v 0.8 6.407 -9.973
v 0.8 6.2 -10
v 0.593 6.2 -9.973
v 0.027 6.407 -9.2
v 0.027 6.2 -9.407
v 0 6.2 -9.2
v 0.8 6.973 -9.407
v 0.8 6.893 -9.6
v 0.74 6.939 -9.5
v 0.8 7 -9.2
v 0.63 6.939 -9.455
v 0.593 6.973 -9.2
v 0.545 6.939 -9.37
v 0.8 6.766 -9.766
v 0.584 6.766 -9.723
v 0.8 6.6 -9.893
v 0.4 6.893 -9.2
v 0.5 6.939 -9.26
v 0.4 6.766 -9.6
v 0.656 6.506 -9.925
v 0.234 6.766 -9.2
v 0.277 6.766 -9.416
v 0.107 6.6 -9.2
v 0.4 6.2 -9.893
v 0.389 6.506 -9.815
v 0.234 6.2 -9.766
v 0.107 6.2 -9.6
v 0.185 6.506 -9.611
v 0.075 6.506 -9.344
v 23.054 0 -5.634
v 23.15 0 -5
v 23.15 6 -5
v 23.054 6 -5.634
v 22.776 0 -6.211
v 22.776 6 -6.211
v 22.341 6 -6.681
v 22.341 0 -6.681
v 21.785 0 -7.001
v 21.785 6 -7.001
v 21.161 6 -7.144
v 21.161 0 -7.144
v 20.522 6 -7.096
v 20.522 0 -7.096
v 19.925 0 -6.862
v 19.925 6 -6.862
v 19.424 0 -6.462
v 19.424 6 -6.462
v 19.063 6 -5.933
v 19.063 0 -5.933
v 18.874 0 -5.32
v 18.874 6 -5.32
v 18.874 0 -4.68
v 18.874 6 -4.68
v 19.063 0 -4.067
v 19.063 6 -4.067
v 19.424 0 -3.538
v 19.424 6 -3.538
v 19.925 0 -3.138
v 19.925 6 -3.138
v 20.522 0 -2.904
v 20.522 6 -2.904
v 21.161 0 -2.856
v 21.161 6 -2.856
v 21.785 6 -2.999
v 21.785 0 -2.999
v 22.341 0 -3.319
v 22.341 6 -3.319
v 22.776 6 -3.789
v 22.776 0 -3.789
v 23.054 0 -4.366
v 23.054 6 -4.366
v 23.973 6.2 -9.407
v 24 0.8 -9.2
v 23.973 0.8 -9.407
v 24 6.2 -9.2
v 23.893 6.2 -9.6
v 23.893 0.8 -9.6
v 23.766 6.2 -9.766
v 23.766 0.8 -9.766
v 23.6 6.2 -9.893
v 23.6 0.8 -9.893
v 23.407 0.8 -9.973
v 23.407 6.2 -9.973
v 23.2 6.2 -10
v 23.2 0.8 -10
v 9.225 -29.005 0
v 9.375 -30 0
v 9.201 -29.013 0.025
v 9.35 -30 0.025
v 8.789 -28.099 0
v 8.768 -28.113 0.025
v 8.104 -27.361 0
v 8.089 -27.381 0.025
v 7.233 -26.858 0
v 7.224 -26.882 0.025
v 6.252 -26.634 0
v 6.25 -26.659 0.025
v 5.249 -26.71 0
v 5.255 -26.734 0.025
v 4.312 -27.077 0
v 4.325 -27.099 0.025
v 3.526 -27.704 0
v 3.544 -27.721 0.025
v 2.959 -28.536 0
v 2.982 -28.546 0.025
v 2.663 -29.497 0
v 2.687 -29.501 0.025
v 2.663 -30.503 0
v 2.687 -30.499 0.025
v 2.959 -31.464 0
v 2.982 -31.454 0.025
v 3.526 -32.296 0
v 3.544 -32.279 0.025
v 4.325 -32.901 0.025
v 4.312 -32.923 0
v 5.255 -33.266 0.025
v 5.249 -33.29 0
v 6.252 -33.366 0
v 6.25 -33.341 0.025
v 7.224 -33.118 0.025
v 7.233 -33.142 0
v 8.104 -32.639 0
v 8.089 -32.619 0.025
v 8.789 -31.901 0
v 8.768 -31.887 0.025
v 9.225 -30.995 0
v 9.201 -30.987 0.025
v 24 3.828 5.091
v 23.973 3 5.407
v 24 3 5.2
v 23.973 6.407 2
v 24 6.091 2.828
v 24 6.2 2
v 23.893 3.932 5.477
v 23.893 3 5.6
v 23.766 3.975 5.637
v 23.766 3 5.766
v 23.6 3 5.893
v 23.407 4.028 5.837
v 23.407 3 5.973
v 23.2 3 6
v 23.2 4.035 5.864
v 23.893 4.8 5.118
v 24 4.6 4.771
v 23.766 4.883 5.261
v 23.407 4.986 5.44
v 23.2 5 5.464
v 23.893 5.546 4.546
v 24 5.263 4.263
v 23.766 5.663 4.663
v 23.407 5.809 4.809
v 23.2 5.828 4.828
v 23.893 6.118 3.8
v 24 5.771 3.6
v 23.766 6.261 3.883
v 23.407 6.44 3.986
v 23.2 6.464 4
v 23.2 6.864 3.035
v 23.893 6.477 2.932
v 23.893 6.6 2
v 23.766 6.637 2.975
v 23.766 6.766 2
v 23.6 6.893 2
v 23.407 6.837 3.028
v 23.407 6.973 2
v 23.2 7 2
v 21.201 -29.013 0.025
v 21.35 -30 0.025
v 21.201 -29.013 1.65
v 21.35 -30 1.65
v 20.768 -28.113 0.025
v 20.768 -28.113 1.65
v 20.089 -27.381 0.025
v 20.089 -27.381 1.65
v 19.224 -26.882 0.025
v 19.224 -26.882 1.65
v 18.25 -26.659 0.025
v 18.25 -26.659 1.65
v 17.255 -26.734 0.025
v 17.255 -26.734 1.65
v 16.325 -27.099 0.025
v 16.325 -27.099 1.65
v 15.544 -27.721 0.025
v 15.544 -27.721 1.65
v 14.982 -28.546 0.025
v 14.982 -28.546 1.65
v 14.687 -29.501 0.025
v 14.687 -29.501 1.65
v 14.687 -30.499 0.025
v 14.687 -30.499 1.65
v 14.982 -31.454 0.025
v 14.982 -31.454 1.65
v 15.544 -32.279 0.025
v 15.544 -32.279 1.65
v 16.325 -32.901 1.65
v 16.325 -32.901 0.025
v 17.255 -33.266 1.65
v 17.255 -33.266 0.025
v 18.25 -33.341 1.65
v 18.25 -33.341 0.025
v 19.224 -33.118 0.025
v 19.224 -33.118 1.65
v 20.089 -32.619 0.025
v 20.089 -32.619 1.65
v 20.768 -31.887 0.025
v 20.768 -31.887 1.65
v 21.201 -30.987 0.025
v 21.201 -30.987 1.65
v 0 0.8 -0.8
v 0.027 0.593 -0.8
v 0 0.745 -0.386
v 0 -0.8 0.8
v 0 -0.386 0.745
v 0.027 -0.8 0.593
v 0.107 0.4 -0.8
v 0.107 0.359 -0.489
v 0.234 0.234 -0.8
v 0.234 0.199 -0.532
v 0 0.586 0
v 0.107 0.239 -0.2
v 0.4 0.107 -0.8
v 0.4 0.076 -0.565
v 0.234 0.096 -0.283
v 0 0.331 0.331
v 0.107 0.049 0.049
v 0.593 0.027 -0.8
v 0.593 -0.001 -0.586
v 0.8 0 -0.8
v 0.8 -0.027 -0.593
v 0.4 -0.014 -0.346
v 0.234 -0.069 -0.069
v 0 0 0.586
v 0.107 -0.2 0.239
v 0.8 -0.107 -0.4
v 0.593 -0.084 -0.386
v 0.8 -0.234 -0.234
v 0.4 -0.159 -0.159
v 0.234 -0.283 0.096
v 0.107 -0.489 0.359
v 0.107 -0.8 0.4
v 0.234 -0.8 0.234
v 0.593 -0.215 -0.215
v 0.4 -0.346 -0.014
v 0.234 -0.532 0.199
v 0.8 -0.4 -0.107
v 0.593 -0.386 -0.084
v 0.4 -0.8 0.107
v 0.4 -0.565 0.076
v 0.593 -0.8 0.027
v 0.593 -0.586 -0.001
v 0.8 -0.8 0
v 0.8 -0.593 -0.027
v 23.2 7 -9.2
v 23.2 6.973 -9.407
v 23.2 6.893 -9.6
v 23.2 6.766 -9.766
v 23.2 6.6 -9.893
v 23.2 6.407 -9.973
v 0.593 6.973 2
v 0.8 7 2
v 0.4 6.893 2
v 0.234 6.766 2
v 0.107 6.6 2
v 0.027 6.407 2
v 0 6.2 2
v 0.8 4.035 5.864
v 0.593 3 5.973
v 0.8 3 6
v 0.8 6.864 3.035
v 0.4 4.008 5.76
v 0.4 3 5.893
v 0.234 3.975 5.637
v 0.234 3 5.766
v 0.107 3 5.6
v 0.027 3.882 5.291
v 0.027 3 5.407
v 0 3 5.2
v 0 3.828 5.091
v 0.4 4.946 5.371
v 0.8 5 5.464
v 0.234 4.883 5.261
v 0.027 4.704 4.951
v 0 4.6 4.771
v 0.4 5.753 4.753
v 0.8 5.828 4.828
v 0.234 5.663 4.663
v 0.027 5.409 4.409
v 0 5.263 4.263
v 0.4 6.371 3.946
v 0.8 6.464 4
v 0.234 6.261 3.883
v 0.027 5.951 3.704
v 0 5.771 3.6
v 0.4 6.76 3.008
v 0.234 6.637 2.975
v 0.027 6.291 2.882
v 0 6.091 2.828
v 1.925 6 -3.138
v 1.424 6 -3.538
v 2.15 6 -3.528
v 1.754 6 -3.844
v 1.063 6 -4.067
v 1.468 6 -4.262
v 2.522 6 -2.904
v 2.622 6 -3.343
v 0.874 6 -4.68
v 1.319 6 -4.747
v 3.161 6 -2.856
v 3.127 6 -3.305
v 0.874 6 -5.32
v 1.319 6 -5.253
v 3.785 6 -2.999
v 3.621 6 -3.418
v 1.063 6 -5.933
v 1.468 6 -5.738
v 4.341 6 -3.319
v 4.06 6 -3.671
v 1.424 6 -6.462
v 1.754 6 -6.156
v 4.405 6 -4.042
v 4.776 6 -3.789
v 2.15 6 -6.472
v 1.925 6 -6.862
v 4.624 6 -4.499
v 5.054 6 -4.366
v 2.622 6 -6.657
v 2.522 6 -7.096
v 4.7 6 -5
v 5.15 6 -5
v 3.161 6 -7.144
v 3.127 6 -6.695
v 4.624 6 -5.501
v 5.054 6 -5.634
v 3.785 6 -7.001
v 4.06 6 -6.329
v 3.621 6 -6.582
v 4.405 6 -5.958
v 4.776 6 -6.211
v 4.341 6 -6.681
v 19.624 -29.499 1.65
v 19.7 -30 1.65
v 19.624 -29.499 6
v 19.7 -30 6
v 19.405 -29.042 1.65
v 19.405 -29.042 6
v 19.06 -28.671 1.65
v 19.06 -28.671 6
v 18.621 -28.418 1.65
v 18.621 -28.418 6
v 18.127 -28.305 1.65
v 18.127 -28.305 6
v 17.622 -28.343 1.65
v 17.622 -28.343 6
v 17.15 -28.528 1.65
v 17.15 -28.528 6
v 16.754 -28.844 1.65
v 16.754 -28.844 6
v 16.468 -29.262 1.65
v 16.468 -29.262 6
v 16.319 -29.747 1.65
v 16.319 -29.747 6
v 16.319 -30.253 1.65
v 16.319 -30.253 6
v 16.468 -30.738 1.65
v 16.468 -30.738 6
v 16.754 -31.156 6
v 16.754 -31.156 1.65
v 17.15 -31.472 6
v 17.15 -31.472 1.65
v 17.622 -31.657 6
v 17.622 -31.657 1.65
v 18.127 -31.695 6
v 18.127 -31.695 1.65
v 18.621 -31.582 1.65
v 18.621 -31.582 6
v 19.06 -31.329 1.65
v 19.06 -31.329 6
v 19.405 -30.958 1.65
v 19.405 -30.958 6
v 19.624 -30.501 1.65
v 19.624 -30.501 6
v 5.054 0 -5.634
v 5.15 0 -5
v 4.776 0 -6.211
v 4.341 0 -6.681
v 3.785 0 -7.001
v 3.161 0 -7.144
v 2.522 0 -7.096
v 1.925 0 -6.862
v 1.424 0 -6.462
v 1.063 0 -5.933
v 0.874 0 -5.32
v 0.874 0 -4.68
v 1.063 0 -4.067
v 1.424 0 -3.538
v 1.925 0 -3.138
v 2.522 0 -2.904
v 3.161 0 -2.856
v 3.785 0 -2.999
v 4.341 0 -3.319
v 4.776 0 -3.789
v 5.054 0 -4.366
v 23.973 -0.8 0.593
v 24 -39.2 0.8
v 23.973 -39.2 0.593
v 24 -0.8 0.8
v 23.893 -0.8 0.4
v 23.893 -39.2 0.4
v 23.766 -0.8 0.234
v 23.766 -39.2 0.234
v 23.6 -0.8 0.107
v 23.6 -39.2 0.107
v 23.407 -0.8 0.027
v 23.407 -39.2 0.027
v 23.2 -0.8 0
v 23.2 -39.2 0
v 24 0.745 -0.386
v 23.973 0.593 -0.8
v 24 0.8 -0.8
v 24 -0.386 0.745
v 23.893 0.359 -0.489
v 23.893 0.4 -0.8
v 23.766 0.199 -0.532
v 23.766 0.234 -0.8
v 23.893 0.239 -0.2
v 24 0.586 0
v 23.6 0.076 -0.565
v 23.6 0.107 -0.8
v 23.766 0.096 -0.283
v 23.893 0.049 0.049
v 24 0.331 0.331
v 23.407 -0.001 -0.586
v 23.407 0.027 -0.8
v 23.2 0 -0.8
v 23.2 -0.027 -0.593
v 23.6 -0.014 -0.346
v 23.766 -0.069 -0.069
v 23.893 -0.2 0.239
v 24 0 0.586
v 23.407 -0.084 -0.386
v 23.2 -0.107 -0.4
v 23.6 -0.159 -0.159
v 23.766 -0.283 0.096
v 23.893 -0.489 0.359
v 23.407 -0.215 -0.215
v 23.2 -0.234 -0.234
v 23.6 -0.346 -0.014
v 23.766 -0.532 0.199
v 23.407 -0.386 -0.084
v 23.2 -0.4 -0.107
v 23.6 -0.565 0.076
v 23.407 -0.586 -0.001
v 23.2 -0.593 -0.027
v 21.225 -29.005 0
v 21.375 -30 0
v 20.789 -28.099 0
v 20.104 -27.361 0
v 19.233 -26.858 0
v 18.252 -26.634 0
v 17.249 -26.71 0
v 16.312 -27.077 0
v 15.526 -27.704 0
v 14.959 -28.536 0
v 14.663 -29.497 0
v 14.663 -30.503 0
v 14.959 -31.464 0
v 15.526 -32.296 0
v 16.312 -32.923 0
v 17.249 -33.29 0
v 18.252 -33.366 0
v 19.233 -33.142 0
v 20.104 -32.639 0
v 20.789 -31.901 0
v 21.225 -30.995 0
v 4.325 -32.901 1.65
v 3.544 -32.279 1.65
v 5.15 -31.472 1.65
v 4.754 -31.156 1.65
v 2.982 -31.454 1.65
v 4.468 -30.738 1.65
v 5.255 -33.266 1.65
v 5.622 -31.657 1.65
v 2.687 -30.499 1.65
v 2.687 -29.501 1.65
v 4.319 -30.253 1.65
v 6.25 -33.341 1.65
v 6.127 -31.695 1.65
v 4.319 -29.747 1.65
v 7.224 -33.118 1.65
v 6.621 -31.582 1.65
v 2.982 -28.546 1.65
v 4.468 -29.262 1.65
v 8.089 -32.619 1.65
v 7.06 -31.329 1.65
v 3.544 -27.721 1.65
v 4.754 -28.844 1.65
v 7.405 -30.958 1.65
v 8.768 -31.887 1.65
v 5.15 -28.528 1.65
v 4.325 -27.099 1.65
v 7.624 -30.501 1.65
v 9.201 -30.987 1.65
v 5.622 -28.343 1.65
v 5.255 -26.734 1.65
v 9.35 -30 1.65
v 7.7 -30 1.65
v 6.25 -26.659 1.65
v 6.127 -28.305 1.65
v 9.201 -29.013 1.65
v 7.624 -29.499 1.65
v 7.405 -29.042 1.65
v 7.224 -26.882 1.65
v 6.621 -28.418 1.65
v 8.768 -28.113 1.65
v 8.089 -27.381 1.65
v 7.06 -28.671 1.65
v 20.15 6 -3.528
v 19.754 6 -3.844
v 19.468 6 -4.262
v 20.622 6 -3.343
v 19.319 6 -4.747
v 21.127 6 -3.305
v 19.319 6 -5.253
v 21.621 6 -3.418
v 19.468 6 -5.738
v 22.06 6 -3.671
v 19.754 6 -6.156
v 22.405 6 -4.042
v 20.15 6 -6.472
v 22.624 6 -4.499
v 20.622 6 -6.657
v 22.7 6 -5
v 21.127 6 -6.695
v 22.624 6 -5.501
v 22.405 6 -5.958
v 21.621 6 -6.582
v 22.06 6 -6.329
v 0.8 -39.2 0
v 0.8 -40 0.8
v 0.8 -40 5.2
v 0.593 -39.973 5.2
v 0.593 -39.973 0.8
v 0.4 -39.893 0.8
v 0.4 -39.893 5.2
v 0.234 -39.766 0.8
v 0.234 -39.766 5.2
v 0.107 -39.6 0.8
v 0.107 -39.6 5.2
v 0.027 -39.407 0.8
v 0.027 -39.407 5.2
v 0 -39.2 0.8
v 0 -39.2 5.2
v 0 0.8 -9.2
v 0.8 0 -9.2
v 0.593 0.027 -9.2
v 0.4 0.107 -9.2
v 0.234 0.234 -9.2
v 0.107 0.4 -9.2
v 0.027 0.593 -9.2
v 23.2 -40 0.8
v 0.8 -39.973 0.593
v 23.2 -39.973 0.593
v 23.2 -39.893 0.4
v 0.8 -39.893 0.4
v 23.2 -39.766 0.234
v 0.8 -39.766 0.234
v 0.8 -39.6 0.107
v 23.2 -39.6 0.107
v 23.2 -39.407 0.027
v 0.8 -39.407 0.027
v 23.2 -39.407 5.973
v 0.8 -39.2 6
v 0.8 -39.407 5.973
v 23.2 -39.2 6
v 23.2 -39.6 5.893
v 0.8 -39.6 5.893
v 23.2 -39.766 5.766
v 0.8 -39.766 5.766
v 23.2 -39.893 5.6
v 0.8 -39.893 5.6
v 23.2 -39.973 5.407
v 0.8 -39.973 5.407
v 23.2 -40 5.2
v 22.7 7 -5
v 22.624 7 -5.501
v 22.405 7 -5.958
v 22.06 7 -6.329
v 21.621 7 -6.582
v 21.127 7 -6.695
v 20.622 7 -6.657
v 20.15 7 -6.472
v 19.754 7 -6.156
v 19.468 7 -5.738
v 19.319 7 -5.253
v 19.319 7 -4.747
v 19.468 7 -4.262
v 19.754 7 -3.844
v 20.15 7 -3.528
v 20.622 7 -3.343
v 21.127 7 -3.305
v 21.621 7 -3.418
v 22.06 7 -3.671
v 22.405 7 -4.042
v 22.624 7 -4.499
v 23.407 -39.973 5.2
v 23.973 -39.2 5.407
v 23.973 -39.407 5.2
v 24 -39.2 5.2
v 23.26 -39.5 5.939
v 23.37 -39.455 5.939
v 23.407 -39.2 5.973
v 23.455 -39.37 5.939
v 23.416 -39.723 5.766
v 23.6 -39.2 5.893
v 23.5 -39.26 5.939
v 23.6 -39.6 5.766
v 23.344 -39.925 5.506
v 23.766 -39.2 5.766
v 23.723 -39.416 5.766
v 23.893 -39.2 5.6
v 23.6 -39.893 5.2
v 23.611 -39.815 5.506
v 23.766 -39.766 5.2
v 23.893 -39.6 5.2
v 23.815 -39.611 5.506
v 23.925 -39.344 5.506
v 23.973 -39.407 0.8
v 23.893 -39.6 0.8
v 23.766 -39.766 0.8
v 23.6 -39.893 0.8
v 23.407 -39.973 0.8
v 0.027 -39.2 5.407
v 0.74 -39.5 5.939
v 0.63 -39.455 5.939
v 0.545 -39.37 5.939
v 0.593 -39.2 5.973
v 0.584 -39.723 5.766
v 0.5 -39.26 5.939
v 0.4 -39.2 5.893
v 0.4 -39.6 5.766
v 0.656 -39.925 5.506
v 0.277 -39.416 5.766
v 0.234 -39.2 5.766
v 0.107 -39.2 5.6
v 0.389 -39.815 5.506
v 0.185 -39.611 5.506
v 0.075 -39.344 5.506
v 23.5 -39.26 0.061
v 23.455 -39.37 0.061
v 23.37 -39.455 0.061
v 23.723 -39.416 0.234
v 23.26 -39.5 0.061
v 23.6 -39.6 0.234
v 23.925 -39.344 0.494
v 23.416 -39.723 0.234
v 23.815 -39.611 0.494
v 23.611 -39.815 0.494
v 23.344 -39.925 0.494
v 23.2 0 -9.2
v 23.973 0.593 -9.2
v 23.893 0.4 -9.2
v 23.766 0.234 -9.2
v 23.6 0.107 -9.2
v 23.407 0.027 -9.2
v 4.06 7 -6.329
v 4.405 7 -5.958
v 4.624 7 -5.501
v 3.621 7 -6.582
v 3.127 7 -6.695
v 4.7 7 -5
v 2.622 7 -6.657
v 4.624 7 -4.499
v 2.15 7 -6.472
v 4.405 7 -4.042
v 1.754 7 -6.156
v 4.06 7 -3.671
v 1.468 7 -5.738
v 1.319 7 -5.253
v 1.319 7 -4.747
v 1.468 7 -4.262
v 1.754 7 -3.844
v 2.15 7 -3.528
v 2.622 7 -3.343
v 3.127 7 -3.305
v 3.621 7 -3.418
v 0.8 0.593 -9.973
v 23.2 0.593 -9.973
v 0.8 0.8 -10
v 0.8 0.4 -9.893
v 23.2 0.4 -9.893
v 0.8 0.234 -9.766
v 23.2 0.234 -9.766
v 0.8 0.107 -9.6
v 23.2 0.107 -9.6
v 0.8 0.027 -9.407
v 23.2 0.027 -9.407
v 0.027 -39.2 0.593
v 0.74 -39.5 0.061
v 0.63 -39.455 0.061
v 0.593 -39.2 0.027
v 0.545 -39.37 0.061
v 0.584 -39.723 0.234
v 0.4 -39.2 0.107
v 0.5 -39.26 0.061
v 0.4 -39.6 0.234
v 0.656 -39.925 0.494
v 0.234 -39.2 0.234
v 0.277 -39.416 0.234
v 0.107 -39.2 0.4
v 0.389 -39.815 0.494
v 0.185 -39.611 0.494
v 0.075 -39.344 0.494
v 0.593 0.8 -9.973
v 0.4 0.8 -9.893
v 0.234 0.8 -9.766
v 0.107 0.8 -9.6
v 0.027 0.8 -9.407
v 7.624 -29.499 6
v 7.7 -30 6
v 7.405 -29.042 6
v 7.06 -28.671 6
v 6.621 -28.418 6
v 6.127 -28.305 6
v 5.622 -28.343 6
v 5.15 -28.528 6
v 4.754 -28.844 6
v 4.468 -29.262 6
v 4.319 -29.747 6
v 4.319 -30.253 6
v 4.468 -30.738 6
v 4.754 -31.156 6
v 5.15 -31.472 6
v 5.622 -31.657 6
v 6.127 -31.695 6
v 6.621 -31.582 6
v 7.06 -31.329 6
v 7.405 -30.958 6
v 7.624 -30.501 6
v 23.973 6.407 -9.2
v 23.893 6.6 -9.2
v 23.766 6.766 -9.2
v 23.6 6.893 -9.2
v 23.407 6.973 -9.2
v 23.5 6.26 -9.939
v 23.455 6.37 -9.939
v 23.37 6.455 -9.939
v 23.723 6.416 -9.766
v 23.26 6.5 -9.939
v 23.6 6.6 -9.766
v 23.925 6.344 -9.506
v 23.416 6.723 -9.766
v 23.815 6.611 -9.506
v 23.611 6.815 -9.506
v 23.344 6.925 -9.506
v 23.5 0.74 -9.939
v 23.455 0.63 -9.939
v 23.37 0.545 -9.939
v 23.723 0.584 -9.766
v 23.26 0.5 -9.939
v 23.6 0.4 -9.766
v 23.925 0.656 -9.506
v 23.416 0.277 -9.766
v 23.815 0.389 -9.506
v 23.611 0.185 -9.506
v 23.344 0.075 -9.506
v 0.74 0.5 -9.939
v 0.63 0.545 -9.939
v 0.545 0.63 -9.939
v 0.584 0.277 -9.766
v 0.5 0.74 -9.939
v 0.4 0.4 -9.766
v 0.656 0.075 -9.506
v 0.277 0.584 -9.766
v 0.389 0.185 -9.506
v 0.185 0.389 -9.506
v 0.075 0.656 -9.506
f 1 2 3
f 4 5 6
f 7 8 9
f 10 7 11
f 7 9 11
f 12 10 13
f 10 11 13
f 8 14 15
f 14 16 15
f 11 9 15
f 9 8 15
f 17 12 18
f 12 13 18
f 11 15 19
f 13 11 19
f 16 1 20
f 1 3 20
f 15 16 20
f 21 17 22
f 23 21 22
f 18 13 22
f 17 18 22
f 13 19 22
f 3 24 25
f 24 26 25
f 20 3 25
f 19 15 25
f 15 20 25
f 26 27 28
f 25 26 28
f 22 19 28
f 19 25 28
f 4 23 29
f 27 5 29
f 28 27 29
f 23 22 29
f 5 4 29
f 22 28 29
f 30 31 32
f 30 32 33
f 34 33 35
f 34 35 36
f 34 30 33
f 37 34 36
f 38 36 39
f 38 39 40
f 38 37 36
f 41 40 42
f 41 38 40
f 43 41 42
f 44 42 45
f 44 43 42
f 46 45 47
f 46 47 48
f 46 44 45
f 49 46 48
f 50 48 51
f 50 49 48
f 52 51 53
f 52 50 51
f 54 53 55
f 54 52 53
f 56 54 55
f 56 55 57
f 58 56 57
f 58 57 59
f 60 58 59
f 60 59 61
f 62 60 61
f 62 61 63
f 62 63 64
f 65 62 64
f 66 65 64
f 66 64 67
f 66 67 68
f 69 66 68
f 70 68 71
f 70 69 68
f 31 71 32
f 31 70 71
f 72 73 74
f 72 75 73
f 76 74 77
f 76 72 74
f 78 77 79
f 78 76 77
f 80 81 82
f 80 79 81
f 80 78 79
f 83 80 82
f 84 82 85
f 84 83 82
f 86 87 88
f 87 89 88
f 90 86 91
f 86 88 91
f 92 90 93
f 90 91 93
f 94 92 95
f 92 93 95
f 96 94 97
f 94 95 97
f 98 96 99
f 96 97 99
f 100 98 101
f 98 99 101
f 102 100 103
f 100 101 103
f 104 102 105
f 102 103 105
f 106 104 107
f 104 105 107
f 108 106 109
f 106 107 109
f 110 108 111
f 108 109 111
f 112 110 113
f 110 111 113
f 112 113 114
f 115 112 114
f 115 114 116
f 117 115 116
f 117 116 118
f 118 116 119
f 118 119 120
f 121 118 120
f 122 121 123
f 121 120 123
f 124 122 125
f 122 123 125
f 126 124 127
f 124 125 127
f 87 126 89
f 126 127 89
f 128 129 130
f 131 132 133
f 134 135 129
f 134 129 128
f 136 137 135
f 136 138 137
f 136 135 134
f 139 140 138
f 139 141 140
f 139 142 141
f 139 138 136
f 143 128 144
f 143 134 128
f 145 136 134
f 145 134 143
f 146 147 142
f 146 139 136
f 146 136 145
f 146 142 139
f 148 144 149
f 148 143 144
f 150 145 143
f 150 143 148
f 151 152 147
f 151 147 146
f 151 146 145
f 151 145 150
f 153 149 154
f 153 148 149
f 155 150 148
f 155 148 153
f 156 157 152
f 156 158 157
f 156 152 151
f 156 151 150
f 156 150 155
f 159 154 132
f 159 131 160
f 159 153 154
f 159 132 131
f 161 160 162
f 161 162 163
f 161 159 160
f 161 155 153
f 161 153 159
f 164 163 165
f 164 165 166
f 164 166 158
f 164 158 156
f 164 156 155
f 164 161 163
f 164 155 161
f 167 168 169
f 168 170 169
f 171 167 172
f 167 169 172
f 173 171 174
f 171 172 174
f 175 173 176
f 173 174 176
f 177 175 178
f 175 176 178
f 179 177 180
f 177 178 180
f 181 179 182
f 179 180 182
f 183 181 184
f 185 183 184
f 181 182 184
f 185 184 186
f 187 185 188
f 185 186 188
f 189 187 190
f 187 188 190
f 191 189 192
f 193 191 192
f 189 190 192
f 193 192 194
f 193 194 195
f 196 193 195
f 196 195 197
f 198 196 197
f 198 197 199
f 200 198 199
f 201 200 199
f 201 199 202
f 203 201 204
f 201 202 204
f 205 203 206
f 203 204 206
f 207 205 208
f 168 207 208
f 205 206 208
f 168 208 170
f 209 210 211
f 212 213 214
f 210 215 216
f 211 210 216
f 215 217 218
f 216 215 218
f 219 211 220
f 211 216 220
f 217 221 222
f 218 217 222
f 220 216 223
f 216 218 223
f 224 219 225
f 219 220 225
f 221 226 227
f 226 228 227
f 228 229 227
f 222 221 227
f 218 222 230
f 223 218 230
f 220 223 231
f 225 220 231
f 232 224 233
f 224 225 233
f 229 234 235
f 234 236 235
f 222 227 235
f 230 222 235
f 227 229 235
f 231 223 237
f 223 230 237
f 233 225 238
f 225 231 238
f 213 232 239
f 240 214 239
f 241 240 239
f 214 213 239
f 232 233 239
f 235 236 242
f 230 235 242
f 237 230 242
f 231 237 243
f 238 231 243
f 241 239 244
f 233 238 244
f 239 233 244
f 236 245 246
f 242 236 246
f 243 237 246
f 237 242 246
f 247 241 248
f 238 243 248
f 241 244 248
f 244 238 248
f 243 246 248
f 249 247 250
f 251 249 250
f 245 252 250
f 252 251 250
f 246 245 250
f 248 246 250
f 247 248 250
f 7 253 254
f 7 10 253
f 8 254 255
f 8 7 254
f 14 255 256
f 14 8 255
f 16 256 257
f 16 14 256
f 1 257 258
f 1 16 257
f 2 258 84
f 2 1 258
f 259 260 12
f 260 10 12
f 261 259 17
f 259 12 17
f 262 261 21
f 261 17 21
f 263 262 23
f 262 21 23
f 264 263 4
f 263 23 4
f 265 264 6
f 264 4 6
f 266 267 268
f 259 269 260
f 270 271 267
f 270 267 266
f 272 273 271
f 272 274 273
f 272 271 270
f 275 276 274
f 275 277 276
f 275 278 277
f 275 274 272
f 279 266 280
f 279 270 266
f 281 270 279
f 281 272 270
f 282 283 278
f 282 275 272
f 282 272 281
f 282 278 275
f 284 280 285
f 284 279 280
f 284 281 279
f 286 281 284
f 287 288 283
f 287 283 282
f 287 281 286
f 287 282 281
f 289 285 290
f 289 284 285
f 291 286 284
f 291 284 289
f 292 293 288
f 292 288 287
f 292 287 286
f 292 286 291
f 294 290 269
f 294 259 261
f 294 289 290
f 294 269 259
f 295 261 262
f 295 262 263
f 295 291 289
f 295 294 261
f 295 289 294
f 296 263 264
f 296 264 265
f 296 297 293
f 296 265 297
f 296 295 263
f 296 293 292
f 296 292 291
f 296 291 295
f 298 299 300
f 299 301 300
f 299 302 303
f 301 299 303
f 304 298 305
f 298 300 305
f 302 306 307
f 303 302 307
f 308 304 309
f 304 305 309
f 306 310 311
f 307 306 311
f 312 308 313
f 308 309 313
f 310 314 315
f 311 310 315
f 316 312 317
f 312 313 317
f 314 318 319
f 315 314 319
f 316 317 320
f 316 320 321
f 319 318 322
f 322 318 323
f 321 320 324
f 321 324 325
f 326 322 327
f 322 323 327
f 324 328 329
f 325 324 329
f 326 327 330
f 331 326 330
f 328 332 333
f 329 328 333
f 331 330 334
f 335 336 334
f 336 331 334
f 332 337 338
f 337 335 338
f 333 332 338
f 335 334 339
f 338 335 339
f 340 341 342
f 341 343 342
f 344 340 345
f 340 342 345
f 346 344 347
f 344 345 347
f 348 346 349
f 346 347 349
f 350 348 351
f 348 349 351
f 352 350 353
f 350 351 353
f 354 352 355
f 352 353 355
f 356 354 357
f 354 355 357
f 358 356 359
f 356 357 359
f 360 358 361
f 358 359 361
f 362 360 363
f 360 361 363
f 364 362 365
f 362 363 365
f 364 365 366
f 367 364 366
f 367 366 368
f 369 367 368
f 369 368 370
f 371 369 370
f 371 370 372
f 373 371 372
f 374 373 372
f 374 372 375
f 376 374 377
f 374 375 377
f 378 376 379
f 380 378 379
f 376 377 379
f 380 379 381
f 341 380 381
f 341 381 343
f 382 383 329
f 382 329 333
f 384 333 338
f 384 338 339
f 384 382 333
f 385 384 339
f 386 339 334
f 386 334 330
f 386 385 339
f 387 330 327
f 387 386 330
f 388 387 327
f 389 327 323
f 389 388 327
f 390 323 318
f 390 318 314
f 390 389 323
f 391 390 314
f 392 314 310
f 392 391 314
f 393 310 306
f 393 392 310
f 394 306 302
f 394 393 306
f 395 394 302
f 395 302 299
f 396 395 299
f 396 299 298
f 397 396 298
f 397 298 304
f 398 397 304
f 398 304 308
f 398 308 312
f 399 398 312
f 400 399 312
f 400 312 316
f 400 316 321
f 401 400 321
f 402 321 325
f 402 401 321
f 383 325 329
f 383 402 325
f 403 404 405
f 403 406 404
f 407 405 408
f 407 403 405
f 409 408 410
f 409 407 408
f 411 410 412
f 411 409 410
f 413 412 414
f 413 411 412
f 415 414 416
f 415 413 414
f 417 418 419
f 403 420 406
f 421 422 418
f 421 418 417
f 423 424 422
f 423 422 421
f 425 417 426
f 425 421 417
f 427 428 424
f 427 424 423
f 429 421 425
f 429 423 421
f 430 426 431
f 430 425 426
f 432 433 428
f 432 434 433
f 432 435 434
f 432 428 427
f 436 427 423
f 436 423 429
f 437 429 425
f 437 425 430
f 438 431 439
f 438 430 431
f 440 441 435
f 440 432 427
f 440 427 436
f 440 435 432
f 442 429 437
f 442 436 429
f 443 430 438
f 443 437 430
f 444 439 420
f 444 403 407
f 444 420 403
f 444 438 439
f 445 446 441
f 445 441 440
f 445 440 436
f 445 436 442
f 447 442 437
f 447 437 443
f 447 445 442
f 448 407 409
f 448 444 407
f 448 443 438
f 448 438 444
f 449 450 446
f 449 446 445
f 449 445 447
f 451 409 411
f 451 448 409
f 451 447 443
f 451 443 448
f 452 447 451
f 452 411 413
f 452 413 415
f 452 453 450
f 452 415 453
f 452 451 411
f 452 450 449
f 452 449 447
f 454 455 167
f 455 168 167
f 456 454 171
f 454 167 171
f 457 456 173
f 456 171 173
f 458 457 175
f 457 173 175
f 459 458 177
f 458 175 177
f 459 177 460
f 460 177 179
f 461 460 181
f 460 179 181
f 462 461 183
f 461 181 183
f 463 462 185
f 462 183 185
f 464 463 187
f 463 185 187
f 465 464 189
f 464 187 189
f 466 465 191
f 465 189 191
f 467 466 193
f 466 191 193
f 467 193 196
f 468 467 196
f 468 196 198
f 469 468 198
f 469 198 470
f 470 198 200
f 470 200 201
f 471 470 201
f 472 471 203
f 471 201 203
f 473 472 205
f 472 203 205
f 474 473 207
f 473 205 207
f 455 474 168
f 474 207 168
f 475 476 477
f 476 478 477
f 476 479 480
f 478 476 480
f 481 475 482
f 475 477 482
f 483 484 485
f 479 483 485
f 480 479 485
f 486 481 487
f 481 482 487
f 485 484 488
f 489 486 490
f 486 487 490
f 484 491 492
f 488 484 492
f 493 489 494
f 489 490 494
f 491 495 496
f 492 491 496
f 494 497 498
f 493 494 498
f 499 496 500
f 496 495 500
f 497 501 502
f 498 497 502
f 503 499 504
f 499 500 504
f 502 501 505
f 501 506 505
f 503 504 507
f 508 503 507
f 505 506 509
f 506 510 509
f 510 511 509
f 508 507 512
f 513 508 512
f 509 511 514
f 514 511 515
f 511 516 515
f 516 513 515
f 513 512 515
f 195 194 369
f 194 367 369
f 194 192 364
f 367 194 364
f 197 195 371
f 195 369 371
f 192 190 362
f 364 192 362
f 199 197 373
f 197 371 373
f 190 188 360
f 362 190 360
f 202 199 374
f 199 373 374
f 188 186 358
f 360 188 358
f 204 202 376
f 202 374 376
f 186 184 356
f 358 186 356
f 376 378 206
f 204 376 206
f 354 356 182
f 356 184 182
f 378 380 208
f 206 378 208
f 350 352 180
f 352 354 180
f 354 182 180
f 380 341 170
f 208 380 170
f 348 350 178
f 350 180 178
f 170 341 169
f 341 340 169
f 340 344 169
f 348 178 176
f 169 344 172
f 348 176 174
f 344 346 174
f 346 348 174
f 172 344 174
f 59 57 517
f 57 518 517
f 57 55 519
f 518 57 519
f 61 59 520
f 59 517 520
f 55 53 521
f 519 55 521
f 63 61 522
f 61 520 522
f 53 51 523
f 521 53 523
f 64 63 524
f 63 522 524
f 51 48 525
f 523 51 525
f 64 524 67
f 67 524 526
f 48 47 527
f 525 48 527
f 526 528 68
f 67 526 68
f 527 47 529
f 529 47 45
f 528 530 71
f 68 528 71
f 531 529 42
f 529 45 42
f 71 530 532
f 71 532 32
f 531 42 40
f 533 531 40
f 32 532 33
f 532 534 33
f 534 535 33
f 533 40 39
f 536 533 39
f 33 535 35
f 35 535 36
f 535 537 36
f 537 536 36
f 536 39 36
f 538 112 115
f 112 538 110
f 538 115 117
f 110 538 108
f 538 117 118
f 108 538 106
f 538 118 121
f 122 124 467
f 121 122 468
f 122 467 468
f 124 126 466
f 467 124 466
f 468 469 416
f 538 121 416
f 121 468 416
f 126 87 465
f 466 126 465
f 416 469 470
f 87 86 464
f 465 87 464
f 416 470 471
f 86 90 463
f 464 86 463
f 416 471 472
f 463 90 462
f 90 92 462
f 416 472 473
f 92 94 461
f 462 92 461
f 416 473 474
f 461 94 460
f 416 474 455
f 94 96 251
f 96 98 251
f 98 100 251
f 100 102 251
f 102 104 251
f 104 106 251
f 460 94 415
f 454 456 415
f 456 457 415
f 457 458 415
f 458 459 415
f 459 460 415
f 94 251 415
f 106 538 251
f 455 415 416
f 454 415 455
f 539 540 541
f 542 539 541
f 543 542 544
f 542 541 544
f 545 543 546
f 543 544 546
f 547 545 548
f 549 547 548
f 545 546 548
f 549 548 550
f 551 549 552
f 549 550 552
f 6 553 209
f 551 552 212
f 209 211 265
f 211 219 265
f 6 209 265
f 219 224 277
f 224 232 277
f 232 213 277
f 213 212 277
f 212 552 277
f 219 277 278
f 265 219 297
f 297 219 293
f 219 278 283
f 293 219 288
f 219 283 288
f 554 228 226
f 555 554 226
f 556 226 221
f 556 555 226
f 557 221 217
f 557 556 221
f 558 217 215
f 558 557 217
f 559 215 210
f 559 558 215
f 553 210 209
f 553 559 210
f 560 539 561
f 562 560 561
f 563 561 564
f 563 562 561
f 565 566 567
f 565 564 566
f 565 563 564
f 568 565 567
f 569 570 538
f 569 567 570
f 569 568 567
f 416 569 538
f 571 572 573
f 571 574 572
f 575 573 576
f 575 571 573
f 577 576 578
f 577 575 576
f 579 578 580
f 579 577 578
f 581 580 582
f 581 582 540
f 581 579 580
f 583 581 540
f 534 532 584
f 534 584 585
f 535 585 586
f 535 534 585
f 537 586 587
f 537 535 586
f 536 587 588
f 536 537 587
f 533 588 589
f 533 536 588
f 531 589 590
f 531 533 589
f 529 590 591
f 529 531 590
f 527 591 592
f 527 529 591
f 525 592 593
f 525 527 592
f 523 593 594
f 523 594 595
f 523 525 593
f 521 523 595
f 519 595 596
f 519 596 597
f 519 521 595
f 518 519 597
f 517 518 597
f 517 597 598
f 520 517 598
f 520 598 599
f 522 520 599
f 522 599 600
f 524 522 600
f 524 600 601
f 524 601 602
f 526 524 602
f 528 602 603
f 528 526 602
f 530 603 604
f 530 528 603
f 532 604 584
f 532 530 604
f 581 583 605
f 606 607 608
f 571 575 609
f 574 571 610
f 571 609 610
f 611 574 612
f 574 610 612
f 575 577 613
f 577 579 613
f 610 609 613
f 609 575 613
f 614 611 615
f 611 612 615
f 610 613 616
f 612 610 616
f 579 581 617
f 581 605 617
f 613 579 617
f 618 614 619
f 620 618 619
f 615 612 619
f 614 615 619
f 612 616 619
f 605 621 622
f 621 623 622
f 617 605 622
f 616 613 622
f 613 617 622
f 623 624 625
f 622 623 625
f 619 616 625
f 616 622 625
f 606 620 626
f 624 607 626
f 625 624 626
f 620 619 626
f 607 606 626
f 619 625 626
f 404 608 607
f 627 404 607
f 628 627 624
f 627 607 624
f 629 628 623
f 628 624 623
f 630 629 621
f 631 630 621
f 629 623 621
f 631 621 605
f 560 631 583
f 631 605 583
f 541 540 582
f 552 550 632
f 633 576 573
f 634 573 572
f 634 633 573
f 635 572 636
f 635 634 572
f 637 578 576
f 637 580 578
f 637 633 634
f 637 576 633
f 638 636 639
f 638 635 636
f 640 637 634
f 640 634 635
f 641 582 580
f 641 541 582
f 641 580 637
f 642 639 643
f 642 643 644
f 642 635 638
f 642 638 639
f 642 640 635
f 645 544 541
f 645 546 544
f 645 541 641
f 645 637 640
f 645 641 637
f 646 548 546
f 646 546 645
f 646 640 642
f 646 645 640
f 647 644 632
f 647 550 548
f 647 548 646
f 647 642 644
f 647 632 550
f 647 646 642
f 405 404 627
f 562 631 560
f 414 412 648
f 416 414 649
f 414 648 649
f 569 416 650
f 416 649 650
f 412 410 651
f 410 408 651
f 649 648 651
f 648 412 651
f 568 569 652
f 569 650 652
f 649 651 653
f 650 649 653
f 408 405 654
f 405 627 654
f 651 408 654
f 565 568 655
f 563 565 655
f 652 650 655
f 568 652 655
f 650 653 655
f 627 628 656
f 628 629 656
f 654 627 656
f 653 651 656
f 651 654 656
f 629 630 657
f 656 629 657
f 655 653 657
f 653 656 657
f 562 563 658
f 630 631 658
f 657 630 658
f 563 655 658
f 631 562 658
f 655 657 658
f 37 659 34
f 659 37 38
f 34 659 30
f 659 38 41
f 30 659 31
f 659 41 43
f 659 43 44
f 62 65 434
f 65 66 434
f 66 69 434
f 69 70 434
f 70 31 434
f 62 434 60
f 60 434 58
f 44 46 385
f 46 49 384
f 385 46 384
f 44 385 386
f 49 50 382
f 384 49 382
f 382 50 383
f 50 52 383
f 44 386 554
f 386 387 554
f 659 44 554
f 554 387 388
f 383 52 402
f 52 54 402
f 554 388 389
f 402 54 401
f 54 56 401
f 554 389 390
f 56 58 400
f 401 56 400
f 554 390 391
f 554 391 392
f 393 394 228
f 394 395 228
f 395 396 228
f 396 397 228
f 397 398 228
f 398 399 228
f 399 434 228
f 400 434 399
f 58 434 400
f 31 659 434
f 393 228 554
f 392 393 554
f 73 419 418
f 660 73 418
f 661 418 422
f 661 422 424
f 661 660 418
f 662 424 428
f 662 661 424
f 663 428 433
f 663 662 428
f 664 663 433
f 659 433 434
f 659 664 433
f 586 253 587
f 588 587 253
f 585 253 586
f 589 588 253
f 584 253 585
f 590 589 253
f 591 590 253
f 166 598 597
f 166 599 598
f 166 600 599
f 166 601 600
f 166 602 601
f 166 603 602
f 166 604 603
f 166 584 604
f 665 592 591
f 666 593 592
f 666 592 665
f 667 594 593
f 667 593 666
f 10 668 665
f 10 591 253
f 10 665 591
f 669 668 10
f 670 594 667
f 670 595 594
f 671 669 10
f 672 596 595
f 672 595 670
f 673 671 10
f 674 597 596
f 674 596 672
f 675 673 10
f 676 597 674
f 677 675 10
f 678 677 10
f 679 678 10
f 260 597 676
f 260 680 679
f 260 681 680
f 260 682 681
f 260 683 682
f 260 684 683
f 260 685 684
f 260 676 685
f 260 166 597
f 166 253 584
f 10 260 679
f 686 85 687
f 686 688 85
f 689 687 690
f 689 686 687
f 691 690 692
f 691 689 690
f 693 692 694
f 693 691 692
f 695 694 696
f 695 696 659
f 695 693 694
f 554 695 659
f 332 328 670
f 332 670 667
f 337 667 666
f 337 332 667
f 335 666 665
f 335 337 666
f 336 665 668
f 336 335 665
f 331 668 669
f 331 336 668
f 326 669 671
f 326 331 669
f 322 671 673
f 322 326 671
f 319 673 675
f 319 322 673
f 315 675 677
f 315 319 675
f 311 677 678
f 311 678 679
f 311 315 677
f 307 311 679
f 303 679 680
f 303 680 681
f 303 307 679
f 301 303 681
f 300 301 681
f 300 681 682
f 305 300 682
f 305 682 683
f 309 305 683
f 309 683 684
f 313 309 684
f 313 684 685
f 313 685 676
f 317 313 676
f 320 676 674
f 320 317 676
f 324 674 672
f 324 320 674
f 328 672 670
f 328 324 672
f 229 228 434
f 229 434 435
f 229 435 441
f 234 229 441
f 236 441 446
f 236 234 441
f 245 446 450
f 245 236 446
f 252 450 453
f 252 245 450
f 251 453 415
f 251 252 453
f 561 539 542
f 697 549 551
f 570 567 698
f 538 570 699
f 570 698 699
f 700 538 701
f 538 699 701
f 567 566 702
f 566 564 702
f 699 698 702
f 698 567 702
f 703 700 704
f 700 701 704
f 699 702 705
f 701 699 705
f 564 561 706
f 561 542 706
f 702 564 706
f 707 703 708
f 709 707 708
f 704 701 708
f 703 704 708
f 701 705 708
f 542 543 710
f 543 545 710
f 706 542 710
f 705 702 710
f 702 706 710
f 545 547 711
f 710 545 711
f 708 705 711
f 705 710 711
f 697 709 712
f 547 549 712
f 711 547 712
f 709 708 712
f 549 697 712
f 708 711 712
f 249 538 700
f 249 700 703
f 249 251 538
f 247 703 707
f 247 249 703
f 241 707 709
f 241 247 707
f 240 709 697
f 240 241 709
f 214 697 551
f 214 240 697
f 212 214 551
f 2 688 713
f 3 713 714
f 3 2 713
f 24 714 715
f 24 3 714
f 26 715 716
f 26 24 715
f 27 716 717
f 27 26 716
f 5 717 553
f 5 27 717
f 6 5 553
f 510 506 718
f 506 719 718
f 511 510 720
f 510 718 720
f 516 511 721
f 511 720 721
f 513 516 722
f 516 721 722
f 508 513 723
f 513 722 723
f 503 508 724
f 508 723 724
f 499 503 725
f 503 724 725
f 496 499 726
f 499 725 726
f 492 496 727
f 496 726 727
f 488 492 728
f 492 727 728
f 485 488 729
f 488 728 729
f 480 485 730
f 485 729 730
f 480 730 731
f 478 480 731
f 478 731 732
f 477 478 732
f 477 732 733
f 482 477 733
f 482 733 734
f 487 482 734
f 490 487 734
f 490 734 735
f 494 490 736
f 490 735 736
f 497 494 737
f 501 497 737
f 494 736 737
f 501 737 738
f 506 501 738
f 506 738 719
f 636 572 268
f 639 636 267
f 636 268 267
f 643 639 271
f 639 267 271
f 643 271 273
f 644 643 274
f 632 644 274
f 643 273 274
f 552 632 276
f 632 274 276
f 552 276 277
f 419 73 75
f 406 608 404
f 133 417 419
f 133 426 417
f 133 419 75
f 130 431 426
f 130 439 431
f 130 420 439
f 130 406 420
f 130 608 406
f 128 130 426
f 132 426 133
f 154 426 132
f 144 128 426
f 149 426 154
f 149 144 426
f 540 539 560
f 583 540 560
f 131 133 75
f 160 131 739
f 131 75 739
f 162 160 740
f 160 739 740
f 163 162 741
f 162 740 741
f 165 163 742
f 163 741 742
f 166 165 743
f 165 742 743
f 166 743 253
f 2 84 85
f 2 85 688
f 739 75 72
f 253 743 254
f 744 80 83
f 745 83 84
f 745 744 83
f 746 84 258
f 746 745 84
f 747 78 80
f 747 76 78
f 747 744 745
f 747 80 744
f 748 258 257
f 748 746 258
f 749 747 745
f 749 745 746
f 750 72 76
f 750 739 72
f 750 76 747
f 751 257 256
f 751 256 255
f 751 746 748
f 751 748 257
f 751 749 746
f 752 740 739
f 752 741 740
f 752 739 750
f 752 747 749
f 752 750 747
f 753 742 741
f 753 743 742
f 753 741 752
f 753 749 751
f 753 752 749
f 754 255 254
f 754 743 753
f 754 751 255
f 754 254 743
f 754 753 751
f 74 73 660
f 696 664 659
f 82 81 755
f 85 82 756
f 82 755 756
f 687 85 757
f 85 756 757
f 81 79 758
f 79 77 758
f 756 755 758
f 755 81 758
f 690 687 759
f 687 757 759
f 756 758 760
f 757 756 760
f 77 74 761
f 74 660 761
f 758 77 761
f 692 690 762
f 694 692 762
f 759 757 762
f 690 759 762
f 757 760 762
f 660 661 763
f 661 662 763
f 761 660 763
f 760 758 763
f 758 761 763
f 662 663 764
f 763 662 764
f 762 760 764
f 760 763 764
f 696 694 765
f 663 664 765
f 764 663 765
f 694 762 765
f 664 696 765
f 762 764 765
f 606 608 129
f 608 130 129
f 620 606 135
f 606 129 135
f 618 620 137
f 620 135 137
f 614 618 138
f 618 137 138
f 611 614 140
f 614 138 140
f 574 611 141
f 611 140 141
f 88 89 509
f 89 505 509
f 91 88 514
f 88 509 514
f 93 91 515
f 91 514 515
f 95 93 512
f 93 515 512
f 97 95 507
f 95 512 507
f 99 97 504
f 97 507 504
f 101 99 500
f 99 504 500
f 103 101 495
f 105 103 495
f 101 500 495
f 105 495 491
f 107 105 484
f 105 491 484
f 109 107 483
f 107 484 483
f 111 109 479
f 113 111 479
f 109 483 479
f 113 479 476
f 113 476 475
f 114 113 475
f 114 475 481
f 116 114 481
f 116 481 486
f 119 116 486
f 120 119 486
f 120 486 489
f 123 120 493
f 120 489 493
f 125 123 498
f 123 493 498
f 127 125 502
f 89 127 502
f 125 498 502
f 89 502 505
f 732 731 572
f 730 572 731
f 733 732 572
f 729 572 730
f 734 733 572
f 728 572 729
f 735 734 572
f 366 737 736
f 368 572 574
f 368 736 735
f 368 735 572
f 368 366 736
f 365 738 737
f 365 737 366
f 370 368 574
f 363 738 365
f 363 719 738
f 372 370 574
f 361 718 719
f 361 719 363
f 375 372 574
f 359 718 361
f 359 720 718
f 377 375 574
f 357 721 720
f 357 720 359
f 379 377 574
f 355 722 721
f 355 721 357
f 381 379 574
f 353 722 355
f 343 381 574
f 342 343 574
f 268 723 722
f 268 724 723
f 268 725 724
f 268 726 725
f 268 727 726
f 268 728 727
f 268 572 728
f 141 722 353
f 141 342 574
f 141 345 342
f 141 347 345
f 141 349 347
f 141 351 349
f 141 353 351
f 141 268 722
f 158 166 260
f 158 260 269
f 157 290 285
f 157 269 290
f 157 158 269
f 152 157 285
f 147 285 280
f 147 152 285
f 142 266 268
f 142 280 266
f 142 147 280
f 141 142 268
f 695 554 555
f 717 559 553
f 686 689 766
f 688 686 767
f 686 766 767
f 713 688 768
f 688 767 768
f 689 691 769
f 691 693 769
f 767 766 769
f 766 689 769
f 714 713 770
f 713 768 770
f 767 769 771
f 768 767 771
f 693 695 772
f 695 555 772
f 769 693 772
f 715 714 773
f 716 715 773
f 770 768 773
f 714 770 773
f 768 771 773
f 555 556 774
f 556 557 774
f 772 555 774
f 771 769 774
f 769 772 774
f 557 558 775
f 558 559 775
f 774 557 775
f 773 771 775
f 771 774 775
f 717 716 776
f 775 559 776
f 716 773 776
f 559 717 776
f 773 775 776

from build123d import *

# Parameters (mm, degrees)
SKETCH2_W           = 24
SKETCH2_H           = 47
BOSS_EXTRUDE1_DEPTH = 6
SKETCH3_W           = 24
SKETCH3_H           = 7
BOSS_EXTRUDE2_DEPTH = 10
HOLE1_OUTLINE_R     = 2.15
HOLE1_DEPTH         = 6
HOLE1_START         = 6
HOLE1_2_OUTLINE_R   = 1.7
HOLE1_2_DEPTH       = 1
FILLET1_R           = 4
FILLET2_R           = 0.8


# Read off the part's stored shape, not the designer's step: Hole1, CBORE for M3 SBHCS1
with BuildPart() as part:
    # Sketch2 → Boss-Extrude1 (new body)
    with BuildSketch(Plane.XY):
        with Locations((12, -16.5)):
            Rectangle(SKETCH2_W, SKETCH2_H)
    extrude(amount=BOSS_EXTRUDE1_DEPTH)

    # Sketch3 → Boss-Extrude2 (add)
    with BuildSketch(Plane(origin=(0, 0, 0), x_dir=(-1, 0, 0), z_dir=(0, 0, -1))):
        with Locations((-12, 3.5)):
            Rectangle(SKETCH3_W, SKETCH3_H)
    extrude(amount=BOSS_EXTRUDE2_DEPTH)

    # Hole1 outline → Hole1 (cut)
    with BuildSketch(Plane(origin=(0, 0, 0), x_dir=(1, 0, 0), z_dir=(0, 1, 0))):
        with Locations((3, 5)):
            Circle(HOLE1_OUTLINE_R)
        with Locations((21, 5)):
            Circle(HOLE1_OUTLINE_R)
    extrude(amount=HOLE1_DEPTH, mode=Mode.SUBTRACT)

    # Hole1 2 outline → Hole1 2 (cut)
    with BuildSketch(Plane(origin=(0, 0, 0), x_dir=(1, 0, 0), z_dir=(0, 1, 0)).offset(HOLE1_START)):
        with Locations((3, 5)):
            Circle(HOLE1_2_OUTLINE_R)
        with Locations((21, 5)):
            Circle(HOLE1_2_OUTLINE_R)
    extrude(amount=HOLE1_2_DEPTH, mode=Mode.SUBTRACT)

    # CBORE for M3 SBHCS1 outline → CBORE for M3 SBHCS1 (revolve, cut)
    with BuildSketch(Plane(origin=(18, -30, 0), x_dir=(1, 0, 0), z_dir=(0, -1, 0))):
        Polygon((1.7, 1.65), (1.7, 6), (0, 6), (0, 0), (3.375, 0), (3.35, 0.025), (3.35, 1.65), align=None)
    revolve(axis=Axis((18, -30, 0), (0, 0, 1)), mode=Mode.SUBTRACT)

    # CBORE for M3 SBHCS1 2 outline → CBORE for M3 SBHCS1 2 (revolve, cut)
    with BuildSketch(Plane(origin=(6, -30, 0), x_dir=(1, 0, 0), z_dir=(0, -1, 0))):
        Polygon((0, 0), (3.375, 0), (3.35, 0.025), (3.35, 1.65), (1.7, 1.65), (1.7, 6), (0, 6), align=None)
    revolve(axis=Axis((6, -30, 0), (0, 0, 1)), mode=Mode.SUBTRACT)

    # Fillet1
    fillet1_edges = [part.edges().sort_by_distance(p)[0] for p in [
        (12, 7, 6),
    ]]
    fillet(fillet1_edges, radius=FILLET1_R)

    # Fillet2
    fillet2_edges = [part.edges().sort_by_distance(p)[0] for p in [
        (24, -40, 3),
        (0, -40, 3),
        (12, -40, 6),
        (24, -18.5, 6),
        (12, 0, 0),
        (24, 0, -5),
        (0, 0, -5),
        (24, 3.5, -10),
        (12, 0, -10),
        (0, 3.5, -10),
        (12, 7, -10),
        (0, -18.5, 6),
        (24, 7, -4),
        (0, 7, -4),
        (24, 5.828427125, 4.828427125),
        (24, -20, 0),
        (0, 5.828427125, 4.828427125),
        (12, -40, 0),
        (0, -20, 0),
    ]]
    fillet(fillet2_edges, radius=FILLET2_R)


solid = part.part
